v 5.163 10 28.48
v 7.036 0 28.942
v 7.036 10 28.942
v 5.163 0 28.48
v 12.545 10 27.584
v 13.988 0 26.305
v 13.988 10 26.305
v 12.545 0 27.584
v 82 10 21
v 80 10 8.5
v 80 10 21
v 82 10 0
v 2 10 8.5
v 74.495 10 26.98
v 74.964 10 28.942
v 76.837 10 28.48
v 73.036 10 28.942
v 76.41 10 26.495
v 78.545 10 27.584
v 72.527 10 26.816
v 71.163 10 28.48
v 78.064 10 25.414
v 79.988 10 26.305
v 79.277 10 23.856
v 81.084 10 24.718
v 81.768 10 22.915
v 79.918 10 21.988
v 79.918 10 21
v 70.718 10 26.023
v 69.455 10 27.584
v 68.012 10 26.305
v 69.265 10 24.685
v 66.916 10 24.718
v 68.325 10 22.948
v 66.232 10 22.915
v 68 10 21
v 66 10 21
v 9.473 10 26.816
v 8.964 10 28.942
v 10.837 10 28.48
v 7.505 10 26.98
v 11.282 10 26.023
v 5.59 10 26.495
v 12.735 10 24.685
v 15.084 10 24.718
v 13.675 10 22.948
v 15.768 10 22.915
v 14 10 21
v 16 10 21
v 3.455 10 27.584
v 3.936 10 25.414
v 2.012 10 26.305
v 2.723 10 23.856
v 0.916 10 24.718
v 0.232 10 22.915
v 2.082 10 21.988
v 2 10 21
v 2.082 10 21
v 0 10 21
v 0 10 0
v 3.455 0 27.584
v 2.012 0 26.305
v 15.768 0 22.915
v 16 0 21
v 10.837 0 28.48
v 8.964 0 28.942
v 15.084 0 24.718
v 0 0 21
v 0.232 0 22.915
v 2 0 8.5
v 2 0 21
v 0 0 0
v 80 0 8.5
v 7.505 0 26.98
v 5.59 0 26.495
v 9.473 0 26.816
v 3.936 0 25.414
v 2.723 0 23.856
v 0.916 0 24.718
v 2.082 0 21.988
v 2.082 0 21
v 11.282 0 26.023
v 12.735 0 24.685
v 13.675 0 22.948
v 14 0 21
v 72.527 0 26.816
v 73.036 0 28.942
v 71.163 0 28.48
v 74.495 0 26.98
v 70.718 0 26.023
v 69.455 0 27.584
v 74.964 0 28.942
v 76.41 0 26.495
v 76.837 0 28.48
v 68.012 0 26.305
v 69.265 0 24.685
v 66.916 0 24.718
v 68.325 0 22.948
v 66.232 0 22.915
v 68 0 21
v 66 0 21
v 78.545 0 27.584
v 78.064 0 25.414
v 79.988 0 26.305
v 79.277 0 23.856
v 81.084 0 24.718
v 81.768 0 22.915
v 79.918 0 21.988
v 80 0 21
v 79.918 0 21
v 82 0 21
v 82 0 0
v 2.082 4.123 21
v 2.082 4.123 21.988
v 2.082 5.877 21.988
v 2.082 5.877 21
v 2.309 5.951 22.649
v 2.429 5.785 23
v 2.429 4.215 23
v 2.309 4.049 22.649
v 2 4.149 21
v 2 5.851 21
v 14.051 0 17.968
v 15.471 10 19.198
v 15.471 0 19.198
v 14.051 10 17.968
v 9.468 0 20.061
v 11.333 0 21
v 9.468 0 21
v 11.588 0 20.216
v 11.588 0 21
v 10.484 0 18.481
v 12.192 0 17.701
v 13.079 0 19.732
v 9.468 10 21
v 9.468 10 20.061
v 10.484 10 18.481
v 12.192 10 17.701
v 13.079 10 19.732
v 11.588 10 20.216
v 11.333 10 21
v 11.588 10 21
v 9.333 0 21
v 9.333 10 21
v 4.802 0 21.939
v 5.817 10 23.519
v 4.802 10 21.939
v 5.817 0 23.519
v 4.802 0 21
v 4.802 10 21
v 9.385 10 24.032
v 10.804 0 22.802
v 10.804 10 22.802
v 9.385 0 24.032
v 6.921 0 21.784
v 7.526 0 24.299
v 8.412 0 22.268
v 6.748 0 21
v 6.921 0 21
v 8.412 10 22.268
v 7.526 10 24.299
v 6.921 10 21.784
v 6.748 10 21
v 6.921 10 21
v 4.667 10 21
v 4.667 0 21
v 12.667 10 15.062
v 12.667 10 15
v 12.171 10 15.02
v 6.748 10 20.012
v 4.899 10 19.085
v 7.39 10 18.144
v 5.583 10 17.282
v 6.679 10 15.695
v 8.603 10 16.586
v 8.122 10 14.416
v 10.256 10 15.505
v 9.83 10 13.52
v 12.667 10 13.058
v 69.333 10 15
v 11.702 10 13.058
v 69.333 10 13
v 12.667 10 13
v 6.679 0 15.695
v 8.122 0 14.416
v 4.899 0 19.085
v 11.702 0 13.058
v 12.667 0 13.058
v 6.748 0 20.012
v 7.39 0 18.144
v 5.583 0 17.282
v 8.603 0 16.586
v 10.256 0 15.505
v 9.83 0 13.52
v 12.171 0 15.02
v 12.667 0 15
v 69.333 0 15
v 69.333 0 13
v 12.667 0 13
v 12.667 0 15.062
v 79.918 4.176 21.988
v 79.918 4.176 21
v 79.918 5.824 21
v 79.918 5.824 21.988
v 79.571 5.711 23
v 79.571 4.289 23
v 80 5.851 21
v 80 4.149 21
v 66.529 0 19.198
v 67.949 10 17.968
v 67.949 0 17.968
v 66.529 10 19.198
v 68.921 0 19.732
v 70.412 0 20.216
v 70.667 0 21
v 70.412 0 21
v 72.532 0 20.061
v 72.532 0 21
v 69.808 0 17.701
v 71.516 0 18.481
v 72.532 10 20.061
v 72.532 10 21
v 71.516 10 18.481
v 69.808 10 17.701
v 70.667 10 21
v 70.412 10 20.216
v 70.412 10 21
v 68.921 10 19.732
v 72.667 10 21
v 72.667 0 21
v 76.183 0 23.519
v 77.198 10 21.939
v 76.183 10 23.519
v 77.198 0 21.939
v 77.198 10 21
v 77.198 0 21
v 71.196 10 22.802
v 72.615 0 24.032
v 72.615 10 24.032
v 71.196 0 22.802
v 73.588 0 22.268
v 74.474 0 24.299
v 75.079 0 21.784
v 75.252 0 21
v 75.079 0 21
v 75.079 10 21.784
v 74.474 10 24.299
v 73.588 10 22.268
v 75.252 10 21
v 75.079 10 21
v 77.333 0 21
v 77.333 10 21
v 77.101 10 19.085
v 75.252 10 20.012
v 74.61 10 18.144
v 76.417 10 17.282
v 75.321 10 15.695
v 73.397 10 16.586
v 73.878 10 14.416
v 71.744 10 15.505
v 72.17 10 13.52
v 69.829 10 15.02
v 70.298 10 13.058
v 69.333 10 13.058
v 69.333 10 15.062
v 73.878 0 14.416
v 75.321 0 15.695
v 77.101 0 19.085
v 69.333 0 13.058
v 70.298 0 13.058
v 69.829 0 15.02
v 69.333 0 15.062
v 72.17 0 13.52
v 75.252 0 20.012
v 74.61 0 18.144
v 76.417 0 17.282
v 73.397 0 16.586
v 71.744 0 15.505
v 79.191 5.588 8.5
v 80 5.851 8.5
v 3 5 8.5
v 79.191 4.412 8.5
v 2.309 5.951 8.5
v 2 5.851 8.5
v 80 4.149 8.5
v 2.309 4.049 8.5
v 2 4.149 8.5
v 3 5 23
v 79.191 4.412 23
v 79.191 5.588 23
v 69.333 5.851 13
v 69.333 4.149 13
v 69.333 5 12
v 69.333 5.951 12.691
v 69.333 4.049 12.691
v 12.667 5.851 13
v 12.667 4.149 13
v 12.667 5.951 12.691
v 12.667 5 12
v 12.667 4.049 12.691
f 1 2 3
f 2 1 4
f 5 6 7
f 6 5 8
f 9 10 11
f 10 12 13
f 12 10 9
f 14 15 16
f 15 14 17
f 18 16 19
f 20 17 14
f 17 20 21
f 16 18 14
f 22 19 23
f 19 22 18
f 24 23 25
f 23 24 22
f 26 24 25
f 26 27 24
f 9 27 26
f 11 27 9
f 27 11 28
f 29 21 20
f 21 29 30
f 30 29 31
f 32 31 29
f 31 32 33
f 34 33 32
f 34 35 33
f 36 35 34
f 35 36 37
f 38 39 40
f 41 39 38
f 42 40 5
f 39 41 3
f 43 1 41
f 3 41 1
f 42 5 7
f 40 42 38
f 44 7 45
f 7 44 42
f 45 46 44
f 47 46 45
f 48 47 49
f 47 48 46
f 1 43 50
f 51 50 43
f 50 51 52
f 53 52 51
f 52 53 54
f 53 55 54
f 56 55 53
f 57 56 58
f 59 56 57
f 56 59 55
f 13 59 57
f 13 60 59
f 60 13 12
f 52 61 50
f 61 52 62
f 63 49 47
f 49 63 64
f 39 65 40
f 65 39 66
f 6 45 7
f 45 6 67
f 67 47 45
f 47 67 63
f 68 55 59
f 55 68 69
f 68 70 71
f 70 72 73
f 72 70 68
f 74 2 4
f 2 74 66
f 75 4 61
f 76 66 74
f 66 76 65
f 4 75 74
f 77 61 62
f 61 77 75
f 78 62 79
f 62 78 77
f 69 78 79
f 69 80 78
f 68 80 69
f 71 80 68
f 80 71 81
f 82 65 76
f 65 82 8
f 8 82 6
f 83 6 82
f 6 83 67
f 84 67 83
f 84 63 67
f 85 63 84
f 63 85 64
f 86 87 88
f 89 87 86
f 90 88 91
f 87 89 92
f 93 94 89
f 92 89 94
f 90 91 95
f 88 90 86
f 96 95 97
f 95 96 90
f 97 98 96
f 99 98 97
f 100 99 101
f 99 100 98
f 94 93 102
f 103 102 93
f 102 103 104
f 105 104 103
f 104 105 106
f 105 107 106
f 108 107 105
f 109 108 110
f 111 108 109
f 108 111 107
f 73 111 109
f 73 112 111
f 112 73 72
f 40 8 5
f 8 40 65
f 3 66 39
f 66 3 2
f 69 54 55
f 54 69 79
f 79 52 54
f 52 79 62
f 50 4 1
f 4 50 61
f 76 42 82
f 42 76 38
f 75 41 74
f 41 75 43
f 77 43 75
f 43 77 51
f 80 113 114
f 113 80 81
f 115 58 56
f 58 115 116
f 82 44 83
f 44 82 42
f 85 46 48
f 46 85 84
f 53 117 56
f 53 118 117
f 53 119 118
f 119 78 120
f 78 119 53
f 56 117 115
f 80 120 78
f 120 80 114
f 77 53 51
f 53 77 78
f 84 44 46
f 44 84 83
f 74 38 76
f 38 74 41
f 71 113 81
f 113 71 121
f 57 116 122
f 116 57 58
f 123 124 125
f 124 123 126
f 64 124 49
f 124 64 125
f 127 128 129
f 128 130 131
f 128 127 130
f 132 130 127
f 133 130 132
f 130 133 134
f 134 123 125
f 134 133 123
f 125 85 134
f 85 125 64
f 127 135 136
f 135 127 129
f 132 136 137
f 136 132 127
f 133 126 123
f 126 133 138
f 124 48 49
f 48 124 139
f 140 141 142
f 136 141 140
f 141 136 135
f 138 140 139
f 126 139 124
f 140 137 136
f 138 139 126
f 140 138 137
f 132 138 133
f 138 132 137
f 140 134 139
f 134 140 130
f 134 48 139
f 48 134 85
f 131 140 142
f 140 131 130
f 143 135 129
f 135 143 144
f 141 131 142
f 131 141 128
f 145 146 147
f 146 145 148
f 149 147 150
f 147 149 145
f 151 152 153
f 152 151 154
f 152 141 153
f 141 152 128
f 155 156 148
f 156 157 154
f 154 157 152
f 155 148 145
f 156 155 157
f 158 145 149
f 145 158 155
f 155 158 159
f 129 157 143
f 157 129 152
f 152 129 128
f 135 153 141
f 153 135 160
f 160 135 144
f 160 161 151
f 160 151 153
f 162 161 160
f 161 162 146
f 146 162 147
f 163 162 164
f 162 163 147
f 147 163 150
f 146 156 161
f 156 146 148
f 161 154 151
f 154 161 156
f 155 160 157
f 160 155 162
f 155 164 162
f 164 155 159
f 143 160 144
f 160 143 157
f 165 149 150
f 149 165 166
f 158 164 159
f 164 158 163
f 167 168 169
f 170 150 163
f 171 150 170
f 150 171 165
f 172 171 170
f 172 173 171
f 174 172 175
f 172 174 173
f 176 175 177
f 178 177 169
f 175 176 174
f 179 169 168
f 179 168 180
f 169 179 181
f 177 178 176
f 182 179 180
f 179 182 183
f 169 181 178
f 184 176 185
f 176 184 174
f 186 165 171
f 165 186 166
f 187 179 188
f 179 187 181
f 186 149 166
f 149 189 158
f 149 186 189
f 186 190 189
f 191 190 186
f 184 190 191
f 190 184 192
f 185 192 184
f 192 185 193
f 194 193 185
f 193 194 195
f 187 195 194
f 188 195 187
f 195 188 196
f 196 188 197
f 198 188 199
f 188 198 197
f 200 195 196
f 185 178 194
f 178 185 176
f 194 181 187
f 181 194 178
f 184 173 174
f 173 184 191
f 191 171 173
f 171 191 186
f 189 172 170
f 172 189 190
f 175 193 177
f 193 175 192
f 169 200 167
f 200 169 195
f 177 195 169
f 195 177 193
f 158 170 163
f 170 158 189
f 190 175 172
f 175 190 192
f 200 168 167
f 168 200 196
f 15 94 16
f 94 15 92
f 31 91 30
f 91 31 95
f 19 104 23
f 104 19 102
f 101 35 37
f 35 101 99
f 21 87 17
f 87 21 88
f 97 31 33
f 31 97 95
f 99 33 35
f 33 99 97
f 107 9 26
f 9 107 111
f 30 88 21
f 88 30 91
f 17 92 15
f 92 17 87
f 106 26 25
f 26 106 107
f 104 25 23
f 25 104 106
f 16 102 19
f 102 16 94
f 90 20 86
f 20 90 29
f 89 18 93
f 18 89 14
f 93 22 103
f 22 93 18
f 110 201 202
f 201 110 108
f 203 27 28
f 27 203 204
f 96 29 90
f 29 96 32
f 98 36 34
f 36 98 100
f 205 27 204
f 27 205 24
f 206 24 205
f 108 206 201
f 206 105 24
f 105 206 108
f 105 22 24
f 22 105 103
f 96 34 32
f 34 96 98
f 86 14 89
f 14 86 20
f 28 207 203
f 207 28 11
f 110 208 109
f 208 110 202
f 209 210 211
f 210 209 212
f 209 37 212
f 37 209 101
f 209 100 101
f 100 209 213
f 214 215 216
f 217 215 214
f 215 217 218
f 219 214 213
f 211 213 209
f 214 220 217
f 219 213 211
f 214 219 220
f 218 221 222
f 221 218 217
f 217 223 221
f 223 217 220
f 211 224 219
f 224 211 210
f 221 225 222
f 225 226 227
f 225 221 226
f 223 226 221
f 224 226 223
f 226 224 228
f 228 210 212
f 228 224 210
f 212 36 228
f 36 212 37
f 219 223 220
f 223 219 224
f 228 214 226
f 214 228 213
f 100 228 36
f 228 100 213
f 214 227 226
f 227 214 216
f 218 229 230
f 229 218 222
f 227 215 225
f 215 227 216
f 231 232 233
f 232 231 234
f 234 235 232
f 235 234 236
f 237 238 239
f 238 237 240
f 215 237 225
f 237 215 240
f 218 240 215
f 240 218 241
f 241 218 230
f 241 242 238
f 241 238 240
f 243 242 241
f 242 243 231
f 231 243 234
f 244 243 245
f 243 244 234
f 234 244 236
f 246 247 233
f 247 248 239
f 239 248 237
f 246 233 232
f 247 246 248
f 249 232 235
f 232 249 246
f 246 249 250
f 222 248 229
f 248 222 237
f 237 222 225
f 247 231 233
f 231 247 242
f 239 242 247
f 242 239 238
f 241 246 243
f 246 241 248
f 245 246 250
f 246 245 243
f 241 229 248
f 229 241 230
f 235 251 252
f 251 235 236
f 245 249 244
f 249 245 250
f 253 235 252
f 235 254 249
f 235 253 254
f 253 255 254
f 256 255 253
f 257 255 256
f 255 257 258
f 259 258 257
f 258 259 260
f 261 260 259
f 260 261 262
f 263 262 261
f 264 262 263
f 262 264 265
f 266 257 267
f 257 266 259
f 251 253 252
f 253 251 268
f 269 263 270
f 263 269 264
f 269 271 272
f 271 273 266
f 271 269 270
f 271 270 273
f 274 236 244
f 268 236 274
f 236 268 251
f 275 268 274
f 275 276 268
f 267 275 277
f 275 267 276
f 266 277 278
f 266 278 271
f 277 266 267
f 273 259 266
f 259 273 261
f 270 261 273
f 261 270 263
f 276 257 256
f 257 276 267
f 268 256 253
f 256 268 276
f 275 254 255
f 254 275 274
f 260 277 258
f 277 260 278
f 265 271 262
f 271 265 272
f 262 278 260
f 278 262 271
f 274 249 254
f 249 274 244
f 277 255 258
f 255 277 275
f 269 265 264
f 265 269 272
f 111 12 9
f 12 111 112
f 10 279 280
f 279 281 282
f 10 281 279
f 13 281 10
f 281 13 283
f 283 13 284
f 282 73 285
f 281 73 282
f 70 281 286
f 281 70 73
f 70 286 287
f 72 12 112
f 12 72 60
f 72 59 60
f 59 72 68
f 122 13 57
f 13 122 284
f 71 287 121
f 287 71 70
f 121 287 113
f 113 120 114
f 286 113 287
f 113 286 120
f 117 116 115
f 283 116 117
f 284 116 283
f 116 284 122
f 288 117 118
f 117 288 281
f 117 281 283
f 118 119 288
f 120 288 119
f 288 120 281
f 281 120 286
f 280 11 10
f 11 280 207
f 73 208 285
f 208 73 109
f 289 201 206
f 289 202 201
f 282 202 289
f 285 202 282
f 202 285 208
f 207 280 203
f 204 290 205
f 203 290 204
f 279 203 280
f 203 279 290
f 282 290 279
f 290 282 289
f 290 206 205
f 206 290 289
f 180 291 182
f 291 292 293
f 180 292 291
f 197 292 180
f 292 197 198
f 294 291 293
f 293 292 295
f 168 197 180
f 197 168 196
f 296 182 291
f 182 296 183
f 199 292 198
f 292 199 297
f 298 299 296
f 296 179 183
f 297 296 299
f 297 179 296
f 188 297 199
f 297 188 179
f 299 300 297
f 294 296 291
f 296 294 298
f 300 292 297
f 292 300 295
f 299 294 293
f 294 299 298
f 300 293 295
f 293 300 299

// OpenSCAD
/*[Global]*/

//---length = 0;

/*[Dimensions]*/

//Select a value larger than the width of your door, at least on 10 millimeters
platform_length = 50; //[10:100]

//height of pring platform. it should be highter then distance from floor to door on few mm
height = 15; // [10:40]
//thickness of door holder base
height_base = 8.5; // [2.5:30]
//width of door holder
width = 10; // [10:40]

/*[Other settings (better to do not change them:)]*/

//thickness of spring, for me 2.5 is good
thickness = 2; // [1.5:3.5]
//Radius of holder springs. ~10mm is fine
r_spring = 8; //[5:15]
//Divider of spring radius, it is actualy works with values from 2.1 to 2.9. I prefer to use r_divider = 2.4
r_divider = 2.4;
//Do you wanna add ribs?
is_reinforced = 1; // [0:no,1:yes]

/*[Hidden]*/
length = platform_length + 4 * r_spring;


// ------------------



draw_part();

module draw_part() {
    cube([length, width, height_base]);  // BASE
    /* SUPPORTS */
    translate([0, 0, height_base]) 
    cube([thickness, width, height - height_base + r_spring - thickness]);
    if (is_reinforced == 1) { translate([thickness, width/2, height_base]) cylinder(h=height  - height_base + r_spring, r=thickness/2); }
    
    translate([length-thickness, 0, height_base]) 
    cube([thickness, width, height - height_base + r_spring - thickness]);
    if (is_reinforced == 1) { translate([length-thickness, width/2, height_base]) cylinder(h=height - height_base + r_spring, r=thickness/2); }
    /* -SUPPORTS- */
    
    /* SPRINGS */
    translate([0,0,height+r_spring-thickness])  draw_spring();
    translate([length,0,height+r_spring-thickness]) mirror([1,0,0]) { draw_spring(); }
    /* -SPRINGS- */
    
    /* PLATFORM */
    translate ([-r_spring/r_divider*4+r_spring*3+thickness,0,height-thickness]) 
    cube([length-2*(-r_spring/r_divider*4+r_spring*3+thickness),width,thickness]);
    translate([length/2, width/2, height-thickness]) 
    
    if (is_reinforced == 1) { rotate([0, 90, 0]) cylinder(h=length-2*(-r_spring/r_divider*4+r_spring*3+thickness), r=thickness/2,center = true); }
    /* PLATFORM */
    

}

module draw_spring() {
   translate([r_spring, 0, 0]) {
       difference() {
           rotate([-90, 0, 0]) cylinder(h=width, r=r_spring);
           rotate([-90, 0, 0]) cylinder(h=width+2, r=r_spring-thickness);
           translate([-r_spring, -1, -r_spring])
           cube([r_spring*2,width+2,r_spring]);
       } 
   }
   translate([-r_spring/r_divider+r_spring*2, 0, 0]) {
       difference() {
           rotate([-90, 0, 0]) cylinder(h=width, r=r_spring/r_divider);
           rotate([-90, 0, 0]) cylinder(h=width+2, r=r_spring/r_divider-thickness);
           translate([-r_spring/r_divider, -1, 0])
           cube([r_spring,width+2,r_spring/r_divider]);
           
       }
    }
    
    translate([-r_spring/r_divider*3+r_spring*2+thickness, 0, 0]) {
        //rotate([-90, 0, 0]) cylinder(h=width+2, r=0.5);
        difference() {
           rotate([-90, 0, 0]) cylinder(h=width, r=r_spring/r_divider);
           rotate([-90, 0, 0]) cylinder(h=width+2, r=r_spring/r_divider-thickness);
           translate([-r_spring/r_divider, -1, -r_spring])
           cube([r_spring,width+2,r_spring]);
           
       }
    }
    
 //   translate([r_spring/r_divider*3+thickness*1.4, 0, height+r_spring]) {
    translate([-r_spring/r_divider*4+r_spring*3+thickness, 0, 0]) {
       //rotate([-90, 0, 0]) cylinder(h=width+2, r=0.5);
       difference() {
           rotate([-90, 0, 0]) cylinder(h=width, r=r_spring);
           rotate([-90, 0, 0]) cylinder(h=width+2, r=r_spring-thickness);
           translate([-r_spring, -1, 0])
           cube([r_spring*2,width+2,r_spring]);
           translate([0, -1, -r_spring])
           cube([r_spring,width+2,r_spring]);
           
       }
    }
}
